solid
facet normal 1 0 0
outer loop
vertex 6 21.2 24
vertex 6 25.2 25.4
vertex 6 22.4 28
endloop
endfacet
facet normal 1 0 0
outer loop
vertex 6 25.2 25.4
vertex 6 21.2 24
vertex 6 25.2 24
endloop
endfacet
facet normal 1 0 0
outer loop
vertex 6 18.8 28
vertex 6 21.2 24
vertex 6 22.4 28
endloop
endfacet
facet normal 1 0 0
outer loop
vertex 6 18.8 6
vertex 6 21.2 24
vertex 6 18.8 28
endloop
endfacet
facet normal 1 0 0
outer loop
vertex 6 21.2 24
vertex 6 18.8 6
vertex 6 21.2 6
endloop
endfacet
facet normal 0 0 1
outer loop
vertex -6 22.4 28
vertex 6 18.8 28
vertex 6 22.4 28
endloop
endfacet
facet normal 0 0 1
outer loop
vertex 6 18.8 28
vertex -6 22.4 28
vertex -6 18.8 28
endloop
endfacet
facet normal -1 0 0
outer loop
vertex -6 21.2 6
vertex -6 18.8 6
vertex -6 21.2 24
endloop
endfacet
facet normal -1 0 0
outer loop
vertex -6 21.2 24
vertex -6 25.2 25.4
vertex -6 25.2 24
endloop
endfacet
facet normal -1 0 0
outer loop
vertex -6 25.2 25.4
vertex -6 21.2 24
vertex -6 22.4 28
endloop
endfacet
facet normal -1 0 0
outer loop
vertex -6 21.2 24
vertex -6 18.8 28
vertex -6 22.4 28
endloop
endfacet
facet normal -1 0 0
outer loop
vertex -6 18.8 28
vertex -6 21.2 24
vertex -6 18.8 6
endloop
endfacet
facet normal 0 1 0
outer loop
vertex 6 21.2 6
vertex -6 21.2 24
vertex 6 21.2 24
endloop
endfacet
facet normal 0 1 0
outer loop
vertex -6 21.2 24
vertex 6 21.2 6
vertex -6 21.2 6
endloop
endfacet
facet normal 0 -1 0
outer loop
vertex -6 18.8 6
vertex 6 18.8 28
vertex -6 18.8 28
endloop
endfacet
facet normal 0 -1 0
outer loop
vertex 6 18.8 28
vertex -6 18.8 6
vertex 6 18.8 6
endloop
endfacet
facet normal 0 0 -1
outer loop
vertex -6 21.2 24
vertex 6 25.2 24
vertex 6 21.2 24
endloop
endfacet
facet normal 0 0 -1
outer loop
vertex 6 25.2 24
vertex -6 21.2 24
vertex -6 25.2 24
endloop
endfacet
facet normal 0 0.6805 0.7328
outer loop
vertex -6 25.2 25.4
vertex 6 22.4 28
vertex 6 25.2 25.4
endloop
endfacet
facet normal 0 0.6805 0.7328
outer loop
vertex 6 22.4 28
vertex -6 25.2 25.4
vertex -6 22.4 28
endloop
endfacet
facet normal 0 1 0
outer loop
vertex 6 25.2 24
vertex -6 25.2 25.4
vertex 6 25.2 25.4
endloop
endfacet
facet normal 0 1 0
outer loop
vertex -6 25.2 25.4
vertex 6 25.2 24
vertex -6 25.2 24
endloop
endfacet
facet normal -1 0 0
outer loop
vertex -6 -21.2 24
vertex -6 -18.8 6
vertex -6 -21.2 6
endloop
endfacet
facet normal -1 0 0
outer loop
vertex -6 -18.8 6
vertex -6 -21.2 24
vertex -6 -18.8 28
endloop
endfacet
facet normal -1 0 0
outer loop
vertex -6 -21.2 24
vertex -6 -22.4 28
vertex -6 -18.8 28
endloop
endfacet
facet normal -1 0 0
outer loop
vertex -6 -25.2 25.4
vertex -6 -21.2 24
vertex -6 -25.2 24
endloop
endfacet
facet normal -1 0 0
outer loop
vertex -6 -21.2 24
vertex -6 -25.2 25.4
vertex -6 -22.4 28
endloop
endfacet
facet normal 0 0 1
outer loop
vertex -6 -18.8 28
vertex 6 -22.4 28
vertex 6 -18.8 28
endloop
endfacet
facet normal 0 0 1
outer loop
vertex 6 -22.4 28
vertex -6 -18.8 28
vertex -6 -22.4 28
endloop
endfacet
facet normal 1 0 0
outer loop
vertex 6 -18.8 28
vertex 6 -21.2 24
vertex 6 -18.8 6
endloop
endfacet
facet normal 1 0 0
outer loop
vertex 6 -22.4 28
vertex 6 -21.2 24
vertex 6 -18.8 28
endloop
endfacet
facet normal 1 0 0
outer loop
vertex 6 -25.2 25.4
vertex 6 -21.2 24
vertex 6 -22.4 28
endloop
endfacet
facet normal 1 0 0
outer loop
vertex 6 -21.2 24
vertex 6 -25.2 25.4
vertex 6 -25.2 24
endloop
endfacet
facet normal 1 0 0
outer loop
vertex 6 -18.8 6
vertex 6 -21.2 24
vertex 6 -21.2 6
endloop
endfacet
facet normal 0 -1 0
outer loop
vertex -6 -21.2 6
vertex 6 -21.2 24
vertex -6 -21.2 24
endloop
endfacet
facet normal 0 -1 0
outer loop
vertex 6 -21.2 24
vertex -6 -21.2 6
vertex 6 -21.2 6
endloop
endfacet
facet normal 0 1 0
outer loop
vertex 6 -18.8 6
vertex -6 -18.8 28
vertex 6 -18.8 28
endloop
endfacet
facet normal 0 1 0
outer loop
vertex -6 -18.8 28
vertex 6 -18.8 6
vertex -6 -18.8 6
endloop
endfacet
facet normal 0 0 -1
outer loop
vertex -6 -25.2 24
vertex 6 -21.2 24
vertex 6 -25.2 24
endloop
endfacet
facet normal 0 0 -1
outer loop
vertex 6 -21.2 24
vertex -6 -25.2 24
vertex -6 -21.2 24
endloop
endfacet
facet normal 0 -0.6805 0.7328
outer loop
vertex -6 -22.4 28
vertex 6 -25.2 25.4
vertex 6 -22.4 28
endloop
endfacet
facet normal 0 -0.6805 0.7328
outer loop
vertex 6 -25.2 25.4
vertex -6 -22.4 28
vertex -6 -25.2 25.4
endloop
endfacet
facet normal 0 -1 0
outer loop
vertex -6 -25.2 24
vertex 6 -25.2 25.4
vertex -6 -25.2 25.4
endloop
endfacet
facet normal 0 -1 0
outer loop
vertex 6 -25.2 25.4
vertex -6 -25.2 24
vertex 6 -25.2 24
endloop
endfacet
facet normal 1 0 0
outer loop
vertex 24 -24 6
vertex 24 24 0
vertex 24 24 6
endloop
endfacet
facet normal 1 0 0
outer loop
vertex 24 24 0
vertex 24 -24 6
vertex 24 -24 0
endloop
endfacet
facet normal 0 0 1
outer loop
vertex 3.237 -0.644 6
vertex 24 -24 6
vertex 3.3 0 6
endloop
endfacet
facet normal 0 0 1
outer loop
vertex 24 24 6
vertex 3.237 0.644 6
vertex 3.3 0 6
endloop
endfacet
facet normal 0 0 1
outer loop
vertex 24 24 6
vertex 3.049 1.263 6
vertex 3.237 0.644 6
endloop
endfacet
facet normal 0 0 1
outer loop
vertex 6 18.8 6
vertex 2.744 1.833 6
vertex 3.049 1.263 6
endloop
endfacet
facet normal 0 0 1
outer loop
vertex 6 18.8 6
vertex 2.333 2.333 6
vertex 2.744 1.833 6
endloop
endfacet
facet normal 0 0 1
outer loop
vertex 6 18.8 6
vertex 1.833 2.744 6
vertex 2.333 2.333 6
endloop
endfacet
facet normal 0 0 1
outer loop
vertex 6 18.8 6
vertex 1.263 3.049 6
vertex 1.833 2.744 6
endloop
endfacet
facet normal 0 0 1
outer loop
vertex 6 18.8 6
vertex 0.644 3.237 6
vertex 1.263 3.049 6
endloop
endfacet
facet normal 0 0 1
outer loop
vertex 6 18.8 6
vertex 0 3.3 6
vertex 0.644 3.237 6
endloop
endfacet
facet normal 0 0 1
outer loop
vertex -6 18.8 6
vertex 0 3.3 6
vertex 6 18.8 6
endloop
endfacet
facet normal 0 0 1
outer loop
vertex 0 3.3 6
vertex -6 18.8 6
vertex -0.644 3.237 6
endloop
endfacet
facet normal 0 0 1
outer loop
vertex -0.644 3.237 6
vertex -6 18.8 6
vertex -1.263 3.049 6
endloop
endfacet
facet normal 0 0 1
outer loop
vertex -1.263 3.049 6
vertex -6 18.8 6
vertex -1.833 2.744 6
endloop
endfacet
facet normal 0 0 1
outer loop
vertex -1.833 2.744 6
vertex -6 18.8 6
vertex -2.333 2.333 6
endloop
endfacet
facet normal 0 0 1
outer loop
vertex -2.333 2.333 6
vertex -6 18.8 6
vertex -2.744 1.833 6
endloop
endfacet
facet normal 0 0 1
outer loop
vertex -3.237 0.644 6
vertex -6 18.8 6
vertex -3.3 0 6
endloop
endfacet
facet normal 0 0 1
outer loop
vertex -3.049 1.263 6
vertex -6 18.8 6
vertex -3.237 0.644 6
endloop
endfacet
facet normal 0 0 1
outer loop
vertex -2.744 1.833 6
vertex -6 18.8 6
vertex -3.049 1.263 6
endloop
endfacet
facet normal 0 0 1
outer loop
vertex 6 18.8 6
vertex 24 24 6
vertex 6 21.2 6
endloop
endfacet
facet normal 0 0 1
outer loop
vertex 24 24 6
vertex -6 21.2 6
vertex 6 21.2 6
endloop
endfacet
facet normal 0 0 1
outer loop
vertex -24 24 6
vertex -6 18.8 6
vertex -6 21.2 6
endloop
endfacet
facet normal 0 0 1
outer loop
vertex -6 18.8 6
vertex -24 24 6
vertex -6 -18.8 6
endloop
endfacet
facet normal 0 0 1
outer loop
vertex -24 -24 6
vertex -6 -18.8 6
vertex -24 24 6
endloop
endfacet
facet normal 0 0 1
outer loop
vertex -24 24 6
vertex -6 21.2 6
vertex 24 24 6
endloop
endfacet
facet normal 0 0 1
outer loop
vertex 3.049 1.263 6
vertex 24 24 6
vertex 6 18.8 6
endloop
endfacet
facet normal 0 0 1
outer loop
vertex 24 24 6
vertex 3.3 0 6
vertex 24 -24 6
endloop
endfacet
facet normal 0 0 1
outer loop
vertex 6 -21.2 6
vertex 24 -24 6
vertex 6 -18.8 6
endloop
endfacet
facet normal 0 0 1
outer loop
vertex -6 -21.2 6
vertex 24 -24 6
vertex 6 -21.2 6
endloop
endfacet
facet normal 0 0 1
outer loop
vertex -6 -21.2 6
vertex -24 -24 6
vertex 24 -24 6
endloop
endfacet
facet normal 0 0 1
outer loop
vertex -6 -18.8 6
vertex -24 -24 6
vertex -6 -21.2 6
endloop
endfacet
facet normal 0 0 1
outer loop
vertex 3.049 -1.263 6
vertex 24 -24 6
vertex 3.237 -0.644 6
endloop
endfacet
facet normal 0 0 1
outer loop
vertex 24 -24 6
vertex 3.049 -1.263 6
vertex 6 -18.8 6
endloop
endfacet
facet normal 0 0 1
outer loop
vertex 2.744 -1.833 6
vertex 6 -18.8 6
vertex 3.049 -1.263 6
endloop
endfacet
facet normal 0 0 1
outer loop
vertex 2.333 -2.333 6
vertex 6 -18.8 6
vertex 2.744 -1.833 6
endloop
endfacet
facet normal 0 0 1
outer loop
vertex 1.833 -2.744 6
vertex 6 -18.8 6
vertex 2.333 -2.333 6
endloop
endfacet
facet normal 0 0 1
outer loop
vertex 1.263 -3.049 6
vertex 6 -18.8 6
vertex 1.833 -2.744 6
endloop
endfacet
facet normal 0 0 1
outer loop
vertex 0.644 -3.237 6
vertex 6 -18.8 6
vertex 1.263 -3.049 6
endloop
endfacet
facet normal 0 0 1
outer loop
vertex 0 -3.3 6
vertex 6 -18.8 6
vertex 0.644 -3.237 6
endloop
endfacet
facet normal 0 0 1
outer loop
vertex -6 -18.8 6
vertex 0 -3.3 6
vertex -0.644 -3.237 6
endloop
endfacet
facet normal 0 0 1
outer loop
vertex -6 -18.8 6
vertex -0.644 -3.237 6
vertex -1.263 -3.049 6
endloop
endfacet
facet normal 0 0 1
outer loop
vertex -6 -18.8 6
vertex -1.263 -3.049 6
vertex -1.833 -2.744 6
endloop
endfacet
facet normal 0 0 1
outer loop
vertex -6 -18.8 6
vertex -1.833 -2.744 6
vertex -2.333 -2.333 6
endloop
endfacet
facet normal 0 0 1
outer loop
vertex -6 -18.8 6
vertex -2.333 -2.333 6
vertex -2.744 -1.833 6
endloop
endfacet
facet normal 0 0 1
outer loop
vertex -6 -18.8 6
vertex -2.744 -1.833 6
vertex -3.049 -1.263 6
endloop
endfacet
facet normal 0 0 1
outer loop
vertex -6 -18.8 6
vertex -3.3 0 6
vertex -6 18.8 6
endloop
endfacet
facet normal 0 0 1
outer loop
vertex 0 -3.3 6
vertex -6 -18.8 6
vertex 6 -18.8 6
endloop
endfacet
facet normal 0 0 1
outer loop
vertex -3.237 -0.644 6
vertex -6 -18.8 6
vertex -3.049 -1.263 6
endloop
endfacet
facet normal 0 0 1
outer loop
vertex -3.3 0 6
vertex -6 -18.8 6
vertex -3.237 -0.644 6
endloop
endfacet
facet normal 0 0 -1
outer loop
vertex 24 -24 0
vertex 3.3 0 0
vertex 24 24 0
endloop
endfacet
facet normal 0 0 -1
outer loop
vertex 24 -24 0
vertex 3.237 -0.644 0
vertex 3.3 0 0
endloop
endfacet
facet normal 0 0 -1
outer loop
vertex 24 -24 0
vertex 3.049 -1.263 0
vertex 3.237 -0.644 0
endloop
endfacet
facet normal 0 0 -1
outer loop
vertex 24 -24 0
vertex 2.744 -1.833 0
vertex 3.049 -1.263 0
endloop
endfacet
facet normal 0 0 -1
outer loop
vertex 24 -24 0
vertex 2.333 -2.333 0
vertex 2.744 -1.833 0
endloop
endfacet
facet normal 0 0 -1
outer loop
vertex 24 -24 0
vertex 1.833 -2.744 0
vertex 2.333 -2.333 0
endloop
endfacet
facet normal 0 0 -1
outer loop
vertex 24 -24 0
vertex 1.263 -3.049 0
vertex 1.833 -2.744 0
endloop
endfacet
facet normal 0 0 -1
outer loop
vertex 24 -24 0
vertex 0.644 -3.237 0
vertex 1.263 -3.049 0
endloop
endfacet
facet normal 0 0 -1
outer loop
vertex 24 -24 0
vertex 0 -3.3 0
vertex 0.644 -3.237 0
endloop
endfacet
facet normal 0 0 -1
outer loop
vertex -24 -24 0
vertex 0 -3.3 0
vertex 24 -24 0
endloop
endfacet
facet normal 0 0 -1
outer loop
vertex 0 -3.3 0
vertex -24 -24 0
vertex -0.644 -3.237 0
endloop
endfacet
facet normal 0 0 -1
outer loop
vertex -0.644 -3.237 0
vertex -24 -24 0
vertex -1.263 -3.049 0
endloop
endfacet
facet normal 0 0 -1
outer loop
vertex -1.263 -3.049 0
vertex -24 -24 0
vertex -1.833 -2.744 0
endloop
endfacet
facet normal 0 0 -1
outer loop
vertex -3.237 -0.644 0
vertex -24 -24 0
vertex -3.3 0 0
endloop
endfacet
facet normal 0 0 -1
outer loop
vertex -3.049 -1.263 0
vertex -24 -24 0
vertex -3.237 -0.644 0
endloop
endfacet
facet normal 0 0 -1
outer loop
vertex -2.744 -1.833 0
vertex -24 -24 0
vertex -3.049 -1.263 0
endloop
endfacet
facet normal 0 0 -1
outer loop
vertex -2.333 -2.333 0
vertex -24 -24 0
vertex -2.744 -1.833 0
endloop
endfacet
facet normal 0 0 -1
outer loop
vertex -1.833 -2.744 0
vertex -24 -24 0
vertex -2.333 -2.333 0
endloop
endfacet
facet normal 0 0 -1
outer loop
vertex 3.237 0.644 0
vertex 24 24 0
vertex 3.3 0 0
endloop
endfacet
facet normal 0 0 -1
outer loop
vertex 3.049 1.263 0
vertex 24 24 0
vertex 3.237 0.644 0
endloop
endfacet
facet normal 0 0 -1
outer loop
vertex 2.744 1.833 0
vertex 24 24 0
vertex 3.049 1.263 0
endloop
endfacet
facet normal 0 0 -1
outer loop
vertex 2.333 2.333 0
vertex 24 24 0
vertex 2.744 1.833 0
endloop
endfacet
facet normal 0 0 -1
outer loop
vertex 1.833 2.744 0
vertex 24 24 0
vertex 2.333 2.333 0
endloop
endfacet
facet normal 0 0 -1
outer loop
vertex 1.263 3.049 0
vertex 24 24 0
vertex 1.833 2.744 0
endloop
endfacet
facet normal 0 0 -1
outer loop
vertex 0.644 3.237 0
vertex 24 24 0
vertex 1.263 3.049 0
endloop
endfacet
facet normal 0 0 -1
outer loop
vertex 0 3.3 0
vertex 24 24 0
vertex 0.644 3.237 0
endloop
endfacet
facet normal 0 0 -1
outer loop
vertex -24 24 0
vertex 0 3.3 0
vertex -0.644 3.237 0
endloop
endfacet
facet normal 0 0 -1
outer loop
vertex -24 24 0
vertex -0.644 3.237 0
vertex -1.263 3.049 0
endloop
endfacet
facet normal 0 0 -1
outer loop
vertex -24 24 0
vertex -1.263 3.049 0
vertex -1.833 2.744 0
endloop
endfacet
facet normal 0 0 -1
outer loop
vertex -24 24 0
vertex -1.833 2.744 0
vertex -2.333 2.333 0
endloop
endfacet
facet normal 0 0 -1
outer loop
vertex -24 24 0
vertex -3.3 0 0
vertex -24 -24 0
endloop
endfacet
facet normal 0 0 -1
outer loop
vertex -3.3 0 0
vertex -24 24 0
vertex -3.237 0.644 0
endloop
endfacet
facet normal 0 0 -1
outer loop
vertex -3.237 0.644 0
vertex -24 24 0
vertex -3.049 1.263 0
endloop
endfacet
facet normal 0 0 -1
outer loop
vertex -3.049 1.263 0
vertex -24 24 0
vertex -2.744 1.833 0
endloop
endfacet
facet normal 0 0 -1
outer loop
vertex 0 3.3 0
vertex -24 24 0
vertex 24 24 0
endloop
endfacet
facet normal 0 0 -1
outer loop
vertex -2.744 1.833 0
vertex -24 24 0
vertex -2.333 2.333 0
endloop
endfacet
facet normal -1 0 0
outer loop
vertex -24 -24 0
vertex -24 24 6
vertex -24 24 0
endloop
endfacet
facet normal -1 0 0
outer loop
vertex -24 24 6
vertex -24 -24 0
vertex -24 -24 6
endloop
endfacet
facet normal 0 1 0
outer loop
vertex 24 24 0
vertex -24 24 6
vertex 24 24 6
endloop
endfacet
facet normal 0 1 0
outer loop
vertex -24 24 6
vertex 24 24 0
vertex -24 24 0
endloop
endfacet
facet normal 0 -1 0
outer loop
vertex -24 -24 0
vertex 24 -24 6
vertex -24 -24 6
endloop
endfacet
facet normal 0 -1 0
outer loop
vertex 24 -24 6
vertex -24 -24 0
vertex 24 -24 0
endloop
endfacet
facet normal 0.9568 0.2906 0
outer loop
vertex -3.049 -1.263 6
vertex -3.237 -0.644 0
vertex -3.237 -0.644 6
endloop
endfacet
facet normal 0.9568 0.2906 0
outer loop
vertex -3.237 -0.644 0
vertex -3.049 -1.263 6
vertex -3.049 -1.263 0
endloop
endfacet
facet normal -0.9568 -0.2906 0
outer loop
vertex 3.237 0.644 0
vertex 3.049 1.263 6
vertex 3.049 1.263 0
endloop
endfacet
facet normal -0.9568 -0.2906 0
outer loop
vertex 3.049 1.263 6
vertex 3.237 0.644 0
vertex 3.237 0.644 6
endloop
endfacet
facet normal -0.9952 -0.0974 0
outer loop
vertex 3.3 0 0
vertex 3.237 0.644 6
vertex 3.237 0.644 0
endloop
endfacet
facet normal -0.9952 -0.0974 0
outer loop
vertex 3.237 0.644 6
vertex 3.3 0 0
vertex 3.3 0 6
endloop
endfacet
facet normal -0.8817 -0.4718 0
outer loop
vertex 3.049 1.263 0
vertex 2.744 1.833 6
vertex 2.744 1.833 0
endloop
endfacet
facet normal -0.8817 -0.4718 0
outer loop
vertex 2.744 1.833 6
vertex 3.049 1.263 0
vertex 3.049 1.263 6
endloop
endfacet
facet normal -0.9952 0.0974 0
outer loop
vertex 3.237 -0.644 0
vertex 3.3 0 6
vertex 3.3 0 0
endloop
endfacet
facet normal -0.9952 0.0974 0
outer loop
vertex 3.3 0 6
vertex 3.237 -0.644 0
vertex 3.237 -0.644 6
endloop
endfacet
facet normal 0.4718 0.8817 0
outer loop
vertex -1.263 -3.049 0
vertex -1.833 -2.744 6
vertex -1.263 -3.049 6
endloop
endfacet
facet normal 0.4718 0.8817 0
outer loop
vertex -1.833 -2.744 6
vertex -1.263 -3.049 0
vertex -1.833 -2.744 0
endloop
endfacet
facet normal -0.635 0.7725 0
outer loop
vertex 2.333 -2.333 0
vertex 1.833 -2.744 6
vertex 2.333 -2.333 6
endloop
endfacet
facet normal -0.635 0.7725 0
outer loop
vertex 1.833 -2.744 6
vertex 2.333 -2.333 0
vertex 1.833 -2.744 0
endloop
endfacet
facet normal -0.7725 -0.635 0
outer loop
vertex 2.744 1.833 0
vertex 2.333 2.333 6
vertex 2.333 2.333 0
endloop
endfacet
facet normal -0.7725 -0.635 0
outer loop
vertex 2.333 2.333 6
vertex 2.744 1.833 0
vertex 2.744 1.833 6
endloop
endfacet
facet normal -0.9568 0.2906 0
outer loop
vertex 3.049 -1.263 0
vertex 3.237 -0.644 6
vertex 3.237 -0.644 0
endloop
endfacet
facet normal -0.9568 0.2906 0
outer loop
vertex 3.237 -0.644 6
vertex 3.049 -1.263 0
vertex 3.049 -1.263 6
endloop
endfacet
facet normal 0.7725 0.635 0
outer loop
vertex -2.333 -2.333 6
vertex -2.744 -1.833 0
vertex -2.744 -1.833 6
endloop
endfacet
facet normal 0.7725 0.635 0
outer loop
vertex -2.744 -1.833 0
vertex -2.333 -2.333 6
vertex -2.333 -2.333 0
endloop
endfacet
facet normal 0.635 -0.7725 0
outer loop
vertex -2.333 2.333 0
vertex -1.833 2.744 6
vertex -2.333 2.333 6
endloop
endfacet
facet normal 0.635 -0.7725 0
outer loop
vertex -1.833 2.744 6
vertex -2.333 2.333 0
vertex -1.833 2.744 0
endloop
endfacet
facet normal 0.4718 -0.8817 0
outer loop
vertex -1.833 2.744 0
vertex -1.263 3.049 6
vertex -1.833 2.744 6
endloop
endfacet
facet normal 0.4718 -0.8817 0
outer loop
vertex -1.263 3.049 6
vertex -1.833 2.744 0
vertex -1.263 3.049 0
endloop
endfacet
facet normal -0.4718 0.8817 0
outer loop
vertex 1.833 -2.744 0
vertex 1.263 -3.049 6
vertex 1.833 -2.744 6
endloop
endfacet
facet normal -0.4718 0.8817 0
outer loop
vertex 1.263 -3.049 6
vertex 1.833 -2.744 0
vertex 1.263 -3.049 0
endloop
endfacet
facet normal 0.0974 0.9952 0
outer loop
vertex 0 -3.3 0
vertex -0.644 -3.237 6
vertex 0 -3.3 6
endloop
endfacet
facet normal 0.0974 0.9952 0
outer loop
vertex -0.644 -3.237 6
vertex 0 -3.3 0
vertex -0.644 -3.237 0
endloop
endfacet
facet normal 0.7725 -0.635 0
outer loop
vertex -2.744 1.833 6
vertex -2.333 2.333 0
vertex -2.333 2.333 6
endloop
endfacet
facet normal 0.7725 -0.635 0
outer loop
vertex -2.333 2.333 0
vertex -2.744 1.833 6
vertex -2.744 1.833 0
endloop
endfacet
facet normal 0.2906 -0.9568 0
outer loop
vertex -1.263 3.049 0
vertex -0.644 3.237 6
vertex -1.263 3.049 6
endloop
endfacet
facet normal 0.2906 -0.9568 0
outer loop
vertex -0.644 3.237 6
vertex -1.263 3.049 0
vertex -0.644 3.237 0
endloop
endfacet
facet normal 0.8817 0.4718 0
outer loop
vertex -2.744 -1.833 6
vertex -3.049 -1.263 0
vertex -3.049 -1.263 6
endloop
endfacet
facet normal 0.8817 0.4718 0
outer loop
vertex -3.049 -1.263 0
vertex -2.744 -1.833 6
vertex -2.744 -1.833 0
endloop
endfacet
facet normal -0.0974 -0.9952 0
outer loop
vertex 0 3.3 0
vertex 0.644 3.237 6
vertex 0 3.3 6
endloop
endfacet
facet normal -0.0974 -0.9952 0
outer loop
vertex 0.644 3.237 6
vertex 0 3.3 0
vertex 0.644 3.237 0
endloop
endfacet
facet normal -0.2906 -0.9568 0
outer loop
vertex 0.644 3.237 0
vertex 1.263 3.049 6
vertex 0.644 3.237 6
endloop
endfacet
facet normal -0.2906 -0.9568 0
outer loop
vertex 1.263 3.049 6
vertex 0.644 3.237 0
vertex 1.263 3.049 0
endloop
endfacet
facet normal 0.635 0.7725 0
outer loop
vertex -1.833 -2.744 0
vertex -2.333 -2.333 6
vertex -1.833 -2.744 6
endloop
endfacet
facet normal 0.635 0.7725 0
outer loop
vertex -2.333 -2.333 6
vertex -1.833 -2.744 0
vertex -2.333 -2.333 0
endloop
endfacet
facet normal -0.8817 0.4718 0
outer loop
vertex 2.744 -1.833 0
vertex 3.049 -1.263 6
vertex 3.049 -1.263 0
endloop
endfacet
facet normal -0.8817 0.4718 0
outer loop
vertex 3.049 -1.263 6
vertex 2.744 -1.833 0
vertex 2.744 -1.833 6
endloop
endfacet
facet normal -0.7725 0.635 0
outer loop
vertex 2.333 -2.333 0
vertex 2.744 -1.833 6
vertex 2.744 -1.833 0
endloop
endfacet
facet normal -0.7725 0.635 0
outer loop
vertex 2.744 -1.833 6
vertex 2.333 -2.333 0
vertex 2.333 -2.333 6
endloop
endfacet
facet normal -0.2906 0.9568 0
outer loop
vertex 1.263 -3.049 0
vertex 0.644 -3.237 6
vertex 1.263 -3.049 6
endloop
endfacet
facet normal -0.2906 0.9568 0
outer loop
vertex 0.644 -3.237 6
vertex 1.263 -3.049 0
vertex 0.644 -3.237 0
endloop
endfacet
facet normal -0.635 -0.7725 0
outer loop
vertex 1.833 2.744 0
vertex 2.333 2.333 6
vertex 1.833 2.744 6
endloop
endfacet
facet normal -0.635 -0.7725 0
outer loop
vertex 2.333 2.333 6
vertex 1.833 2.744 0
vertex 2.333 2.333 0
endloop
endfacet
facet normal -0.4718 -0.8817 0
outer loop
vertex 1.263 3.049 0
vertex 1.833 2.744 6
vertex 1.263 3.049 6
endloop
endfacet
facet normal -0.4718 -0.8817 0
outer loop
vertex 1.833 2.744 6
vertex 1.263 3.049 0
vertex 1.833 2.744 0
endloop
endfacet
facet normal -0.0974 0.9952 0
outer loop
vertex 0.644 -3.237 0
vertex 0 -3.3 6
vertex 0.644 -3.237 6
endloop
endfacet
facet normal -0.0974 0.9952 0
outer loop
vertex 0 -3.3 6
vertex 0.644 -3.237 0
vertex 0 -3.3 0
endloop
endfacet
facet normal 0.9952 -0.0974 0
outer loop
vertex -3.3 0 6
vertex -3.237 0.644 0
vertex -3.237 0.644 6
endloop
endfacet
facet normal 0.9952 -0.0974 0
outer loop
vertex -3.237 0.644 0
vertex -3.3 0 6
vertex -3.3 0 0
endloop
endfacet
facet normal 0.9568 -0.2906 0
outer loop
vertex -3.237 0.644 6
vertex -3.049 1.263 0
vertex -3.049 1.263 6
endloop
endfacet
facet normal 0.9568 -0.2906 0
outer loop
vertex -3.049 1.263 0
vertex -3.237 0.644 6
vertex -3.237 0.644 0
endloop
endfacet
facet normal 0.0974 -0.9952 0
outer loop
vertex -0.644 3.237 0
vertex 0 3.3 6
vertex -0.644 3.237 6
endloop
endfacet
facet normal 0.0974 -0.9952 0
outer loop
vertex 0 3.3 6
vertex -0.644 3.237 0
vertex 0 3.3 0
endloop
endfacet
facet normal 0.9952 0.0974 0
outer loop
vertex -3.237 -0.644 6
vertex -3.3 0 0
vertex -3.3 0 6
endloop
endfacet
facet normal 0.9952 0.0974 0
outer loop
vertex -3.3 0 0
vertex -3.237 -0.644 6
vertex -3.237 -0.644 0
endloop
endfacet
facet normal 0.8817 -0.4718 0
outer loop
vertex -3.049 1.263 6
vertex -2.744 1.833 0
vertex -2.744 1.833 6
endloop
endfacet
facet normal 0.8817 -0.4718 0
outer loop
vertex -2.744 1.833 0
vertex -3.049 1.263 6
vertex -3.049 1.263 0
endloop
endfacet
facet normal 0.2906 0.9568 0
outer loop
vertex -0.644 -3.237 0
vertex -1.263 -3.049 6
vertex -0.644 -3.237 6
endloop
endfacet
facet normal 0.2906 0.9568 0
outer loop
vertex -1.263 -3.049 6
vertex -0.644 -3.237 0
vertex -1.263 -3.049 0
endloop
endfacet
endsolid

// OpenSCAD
$fn = 32;

// ----------------------------------------------------------------------
// Snap-fit latch: 2 arms, 22 mm tall, 4.2 mm undercut hooks
// ----------------------------------------------------------------------

// --- parameters (mm) ---
base_d = 48;              // base plate depth
base_h = 6;               // base plate thickness
span = 40;                // distance between opposite arms
arm_t = 2.4;              // arm thickness
arm_d = 12;               // arm width
height = 22;              // free arm length
head_len = 4.2;           // hook reach
head_h = 4;               // hook height
lead = 1.4;               // lead-in ramp thickness
bore_d = 6.6;             // base fixing bore
top_z = 28;               // height of the arm tips above the base

arms = 2;

difference() {
  union() {
    /* base plate, centred on the arm ring */
    translate([-24, -24, 0]) cube([base_d, base_d, base_h]);
    for (a = [0 : 360 / arms : 359]) rotate([0, 0, a]) {
    /* arm, sunk 0.5 mm into the base */
    translate([-arm_d / 2, span / 2 - arm_t / 2, base_h - 0.5]) cube([arm_d, arm_t, height + 0.5]);
    /* hook: a convex hull of a tall inner block and a thin outer lip
       gives a flat undercut below and a lead-in ramp on top */
    hull() {
      translate([-arm_d / 2, span / 2 + arm_t / 2 - 0.6, top_z - head_h]) cube([arm_d, lead + 0.4, head_h]);
      translate([-arm_d / 2, span / 2 + arm_t / 2 - 0.2, top_z - head_h]) cube([arm_d, head_len, lead]);
    }
    }
  }
  translate([0, 0, -2.5]) cylinder(h = base_h + 5, d = bore_d);
}
